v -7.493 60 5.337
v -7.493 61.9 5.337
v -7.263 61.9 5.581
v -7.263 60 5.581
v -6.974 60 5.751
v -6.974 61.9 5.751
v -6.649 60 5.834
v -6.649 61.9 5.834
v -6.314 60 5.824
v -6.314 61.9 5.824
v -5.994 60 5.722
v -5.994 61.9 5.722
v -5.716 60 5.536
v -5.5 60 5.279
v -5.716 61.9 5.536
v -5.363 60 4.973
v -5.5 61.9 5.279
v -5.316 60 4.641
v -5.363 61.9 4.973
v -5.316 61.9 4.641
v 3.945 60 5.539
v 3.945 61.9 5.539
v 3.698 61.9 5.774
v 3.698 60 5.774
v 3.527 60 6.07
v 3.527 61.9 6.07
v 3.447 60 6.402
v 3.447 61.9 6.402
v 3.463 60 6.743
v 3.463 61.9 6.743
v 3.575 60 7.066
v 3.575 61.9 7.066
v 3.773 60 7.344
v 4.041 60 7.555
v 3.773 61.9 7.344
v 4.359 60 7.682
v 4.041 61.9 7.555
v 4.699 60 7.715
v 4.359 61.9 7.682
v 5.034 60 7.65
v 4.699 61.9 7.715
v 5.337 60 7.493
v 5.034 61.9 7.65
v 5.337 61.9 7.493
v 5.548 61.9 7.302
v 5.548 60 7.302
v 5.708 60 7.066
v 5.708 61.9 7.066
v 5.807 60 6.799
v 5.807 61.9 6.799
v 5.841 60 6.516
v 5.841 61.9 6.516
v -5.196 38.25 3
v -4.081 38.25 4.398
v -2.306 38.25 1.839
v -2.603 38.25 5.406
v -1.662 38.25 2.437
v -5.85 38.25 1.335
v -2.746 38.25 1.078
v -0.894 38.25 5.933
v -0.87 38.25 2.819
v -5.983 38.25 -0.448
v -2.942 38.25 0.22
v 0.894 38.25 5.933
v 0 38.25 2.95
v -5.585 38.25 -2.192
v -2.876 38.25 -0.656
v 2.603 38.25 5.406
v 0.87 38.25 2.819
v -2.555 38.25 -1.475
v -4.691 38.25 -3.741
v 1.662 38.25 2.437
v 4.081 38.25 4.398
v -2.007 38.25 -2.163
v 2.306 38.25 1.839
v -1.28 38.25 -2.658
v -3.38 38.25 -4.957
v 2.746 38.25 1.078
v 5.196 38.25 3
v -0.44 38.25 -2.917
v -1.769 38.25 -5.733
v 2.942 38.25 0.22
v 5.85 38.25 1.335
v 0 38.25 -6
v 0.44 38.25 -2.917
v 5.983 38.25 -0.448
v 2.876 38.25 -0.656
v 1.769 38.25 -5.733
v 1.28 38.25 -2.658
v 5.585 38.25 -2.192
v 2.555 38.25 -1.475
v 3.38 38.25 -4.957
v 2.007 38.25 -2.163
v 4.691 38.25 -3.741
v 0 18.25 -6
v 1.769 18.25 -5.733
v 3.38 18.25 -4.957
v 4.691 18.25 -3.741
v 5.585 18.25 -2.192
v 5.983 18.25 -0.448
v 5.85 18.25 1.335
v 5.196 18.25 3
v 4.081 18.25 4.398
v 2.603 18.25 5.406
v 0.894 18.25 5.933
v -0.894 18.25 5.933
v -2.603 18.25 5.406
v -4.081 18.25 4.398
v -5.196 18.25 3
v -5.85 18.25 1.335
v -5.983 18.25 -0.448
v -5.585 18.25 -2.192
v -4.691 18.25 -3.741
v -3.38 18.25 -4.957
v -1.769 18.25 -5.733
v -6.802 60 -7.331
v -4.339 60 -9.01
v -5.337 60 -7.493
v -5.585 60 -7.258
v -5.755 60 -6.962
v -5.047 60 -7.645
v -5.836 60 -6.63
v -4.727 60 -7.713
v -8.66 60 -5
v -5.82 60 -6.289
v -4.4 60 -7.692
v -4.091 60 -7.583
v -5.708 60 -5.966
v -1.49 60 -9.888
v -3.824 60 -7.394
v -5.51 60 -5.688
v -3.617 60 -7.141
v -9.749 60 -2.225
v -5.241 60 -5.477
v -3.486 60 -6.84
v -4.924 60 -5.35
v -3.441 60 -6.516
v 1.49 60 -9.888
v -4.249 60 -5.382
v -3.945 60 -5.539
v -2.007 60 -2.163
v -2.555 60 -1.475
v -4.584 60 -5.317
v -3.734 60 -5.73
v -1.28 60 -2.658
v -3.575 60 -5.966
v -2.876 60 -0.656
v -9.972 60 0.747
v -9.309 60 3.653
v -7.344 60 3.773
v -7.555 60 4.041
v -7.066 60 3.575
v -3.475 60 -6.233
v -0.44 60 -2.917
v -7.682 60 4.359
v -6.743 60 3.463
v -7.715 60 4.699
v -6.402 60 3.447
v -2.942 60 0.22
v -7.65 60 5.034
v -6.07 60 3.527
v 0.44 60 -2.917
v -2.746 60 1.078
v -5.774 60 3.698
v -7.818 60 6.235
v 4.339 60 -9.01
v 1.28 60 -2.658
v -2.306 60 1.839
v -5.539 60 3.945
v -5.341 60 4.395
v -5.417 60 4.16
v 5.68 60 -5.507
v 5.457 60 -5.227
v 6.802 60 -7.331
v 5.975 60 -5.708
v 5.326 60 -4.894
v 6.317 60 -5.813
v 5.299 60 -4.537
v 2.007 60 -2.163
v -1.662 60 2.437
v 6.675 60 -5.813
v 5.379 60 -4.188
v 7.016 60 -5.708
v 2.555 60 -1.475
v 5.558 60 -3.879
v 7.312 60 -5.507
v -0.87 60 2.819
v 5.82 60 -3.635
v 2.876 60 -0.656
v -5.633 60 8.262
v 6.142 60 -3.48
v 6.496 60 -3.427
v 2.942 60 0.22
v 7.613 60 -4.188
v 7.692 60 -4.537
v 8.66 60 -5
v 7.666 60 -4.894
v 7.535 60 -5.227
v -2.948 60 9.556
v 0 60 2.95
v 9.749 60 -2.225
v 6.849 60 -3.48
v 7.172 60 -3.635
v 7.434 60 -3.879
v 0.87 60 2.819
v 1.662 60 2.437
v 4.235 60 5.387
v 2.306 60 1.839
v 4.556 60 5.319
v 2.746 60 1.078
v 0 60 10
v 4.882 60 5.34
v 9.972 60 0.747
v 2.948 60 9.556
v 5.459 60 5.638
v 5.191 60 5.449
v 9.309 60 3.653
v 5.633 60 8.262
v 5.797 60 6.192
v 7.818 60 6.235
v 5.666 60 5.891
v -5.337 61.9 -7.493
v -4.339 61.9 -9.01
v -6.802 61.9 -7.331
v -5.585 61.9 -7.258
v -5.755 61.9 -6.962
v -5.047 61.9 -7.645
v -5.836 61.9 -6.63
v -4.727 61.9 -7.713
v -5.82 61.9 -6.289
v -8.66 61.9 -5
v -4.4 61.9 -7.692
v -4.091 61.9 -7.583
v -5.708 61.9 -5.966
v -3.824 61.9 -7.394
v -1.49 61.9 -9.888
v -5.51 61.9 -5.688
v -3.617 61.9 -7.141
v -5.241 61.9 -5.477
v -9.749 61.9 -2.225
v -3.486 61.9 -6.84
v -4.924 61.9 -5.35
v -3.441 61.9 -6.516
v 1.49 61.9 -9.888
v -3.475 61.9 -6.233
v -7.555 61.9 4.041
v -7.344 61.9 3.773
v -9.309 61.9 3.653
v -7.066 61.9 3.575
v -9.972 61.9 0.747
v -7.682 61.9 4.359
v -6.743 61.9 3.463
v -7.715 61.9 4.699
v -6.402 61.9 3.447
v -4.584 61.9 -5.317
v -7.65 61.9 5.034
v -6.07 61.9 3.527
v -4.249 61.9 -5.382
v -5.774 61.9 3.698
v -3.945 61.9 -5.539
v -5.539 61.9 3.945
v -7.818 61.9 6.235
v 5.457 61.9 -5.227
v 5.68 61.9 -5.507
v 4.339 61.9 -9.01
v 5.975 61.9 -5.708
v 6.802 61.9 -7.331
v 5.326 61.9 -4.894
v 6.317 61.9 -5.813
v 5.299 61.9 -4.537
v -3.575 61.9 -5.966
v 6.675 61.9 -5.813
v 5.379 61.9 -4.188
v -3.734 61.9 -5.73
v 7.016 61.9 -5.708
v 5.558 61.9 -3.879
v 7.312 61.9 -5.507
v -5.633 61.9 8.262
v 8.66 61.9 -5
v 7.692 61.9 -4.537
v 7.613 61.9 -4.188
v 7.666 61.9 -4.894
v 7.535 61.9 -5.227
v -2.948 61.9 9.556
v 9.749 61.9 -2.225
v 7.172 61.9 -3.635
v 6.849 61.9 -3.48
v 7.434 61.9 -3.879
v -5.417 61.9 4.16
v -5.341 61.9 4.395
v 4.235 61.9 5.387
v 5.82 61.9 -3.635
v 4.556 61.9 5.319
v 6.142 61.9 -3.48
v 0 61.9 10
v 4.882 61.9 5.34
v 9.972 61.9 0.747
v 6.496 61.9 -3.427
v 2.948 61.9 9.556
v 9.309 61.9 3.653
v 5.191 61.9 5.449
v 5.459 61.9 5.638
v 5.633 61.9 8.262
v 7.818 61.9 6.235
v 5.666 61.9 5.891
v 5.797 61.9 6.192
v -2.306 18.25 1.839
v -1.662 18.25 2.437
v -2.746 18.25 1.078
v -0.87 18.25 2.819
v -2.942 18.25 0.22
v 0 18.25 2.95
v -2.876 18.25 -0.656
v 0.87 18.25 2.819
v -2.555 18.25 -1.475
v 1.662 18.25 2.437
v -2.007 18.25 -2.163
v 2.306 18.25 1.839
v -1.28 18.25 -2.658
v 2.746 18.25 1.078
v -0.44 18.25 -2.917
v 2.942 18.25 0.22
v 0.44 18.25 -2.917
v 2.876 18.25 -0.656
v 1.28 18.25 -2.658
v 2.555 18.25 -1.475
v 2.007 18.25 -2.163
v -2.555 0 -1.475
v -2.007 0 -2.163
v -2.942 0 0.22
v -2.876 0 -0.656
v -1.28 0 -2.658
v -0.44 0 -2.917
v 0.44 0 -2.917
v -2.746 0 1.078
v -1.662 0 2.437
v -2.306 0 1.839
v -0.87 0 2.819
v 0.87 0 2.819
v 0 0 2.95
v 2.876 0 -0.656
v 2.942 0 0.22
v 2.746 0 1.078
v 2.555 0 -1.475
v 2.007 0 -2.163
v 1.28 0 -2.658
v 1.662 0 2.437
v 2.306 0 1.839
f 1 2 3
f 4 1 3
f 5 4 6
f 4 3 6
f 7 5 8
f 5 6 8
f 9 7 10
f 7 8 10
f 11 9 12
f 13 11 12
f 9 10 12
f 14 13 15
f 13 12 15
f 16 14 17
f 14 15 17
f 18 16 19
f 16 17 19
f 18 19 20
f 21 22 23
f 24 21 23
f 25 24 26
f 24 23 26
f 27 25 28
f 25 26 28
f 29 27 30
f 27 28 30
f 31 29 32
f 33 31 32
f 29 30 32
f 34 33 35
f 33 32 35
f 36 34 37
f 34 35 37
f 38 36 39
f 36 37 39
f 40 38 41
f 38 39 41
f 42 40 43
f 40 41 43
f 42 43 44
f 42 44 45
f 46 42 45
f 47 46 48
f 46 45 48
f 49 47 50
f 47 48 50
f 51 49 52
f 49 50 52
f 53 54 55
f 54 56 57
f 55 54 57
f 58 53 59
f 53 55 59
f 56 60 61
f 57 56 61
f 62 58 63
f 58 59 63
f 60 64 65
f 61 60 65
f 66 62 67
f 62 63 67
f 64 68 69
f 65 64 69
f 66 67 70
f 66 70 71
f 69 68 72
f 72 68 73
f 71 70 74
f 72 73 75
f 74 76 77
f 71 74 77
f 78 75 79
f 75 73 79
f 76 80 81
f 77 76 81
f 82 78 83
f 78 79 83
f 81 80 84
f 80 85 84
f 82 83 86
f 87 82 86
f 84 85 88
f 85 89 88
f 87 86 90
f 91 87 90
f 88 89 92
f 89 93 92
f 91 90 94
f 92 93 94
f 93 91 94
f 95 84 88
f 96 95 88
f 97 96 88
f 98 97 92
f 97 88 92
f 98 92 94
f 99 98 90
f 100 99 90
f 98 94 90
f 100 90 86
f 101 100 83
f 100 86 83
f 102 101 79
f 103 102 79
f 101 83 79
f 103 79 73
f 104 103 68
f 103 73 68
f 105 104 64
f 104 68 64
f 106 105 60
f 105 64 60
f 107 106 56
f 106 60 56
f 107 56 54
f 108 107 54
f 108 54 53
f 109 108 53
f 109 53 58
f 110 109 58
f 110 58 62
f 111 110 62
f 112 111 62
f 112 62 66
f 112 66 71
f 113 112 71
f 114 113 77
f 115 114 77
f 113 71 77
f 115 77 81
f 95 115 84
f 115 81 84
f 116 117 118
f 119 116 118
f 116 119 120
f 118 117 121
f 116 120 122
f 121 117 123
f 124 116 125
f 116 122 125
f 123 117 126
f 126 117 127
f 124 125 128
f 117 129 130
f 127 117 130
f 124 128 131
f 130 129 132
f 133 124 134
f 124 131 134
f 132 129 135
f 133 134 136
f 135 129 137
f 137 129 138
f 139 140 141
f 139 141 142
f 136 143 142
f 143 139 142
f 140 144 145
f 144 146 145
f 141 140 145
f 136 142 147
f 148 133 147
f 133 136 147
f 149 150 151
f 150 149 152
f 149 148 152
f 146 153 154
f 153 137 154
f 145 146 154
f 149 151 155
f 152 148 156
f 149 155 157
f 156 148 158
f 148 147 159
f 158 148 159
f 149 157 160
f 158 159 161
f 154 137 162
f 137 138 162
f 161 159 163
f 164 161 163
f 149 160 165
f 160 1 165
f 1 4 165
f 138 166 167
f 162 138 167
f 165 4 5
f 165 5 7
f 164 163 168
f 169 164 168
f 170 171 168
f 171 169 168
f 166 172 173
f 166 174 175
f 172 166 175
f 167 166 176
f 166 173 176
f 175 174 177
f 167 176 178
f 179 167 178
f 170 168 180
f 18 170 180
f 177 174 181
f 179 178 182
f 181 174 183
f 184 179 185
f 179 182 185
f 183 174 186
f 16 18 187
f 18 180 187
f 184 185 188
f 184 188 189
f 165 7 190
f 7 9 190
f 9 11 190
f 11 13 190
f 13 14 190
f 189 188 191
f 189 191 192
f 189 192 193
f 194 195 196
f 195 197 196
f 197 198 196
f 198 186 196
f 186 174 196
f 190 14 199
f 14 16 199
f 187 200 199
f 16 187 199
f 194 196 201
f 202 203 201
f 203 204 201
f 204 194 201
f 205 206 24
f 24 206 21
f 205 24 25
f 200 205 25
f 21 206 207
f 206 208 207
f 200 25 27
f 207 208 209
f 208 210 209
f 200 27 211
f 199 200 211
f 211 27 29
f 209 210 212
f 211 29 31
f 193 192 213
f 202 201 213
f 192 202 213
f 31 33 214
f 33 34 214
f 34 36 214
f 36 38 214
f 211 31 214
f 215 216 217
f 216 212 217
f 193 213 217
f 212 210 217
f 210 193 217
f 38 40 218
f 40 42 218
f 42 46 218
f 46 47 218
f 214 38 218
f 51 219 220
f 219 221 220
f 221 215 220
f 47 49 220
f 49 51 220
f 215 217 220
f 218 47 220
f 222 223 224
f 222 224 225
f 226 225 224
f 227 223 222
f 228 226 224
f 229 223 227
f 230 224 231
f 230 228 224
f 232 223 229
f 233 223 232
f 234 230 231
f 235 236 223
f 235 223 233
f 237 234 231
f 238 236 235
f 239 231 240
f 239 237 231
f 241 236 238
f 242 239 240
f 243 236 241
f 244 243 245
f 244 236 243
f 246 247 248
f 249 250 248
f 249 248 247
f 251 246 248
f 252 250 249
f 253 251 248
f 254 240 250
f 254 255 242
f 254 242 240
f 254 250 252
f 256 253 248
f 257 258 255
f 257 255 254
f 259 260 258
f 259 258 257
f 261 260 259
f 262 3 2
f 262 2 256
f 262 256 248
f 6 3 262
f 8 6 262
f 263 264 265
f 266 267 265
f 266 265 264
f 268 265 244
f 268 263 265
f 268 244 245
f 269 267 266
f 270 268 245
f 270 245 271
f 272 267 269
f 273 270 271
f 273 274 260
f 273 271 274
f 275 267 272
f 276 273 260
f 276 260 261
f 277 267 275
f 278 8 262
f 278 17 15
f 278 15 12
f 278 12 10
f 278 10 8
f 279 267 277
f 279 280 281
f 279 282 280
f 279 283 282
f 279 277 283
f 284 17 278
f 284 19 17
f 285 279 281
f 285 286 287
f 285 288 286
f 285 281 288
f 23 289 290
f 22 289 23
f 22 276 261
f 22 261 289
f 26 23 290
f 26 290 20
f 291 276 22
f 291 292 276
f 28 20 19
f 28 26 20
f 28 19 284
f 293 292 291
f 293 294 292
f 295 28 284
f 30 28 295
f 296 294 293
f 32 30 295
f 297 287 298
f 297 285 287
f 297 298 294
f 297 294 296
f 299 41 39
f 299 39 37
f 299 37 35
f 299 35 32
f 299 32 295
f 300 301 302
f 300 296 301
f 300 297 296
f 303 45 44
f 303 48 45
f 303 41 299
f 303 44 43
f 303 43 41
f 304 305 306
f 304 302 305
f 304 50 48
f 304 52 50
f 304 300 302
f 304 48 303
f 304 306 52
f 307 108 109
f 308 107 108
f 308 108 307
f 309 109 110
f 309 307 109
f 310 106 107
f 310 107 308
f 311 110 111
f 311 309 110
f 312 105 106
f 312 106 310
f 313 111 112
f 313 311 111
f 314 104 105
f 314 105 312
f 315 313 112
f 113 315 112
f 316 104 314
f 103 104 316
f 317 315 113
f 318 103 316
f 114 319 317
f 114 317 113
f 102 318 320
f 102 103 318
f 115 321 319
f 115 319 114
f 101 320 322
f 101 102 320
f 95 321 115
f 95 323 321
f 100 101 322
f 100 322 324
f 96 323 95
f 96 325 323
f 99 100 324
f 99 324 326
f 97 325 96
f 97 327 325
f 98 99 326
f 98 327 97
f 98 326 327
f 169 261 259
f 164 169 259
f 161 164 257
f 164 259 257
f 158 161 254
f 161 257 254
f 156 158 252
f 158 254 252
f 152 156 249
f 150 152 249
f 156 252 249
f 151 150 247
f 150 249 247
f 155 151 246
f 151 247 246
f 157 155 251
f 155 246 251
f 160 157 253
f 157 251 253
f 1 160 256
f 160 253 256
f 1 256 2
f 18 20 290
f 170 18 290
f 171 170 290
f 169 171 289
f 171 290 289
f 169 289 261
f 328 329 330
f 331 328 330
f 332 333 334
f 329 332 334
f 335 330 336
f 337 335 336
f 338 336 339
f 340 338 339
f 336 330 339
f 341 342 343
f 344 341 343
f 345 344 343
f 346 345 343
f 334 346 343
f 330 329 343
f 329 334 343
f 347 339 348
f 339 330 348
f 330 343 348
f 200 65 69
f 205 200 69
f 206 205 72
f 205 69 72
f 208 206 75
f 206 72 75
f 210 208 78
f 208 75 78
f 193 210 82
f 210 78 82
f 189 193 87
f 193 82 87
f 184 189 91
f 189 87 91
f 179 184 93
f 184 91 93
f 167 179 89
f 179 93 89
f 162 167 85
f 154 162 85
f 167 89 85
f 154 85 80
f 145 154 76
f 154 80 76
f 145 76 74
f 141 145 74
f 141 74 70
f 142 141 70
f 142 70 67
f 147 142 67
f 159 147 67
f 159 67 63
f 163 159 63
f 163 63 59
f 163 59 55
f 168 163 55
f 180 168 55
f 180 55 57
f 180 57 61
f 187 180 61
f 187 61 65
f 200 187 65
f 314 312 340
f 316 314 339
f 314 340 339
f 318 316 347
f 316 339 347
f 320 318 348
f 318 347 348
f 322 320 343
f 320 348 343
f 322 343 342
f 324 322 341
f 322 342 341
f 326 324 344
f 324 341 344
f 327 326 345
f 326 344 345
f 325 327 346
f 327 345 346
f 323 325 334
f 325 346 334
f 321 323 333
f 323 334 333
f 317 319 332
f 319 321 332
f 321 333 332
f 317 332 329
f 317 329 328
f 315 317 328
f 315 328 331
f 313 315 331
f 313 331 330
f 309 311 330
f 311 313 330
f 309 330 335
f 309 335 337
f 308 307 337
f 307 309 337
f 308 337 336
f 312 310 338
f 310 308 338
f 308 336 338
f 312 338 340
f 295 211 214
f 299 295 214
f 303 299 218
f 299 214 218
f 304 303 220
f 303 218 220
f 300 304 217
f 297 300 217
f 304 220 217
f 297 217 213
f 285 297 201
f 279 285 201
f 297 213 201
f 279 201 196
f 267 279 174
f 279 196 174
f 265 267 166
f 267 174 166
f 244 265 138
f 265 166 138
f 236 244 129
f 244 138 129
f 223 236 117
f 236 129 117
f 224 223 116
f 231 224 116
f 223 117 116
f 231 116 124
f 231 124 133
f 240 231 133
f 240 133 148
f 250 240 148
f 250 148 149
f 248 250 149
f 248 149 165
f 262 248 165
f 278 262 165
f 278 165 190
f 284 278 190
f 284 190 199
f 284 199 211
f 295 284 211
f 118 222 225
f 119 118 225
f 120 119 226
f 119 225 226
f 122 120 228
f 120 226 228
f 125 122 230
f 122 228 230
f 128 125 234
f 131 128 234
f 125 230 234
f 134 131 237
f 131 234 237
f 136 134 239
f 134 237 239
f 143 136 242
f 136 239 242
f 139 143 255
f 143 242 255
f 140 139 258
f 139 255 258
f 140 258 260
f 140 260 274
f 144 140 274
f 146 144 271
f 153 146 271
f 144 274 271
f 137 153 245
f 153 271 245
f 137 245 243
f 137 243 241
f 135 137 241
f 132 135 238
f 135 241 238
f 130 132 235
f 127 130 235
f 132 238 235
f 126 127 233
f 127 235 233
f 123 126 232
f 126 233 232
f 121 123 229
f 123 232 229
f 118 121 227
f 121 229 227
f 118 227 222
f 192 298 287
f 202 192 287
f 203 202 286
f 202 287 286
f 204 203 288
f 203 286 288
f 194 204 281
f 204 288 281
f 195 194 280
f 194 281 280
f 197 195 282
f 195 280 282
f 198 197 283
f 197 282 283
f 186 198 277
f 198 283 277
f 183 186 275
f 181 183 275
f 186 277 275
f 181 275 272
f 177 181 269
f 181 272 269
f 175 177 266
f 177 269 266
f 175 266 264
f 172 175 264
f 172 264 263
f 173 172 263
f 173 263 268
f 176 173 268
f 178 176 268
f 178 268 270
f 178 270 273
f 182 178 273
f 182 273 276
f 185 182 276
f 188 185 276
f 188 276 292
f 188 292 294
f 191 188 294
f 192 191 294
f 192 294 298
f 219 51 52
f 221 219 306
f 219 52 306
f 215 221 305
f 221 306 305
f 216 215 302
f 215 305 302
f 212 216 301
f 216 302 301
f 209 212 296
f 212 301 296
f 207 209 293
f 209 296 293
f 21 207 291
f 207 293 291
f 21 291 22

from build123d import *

# Parameters (mm, degrees)
ESQUISSE1_R             = 2.95
BOSS_EXTRU_1_DEPTH      = 60
ESQUISSE2_R             = 10
BOSS_EXTRU_2_DEPTH      = 3
ESQUISSE3_R             = 1.2
ENL_V_MAT_EXTRU_1_DEPTH = 10
ESQUISSE4_R             = 10
ESQUISSE4_R_2           = 1.2
ENL_V_MAT_EXTRU_2_DEPTH = 1.1
ESQUISSE5_R             = 6
BOSS_EXTRU_3_DEPTH      = 20


with BuildPart() as part:
    # Esquisse1 → Boss.-Extru.1 (new body)
    with BuildSketch(Plane(origin=(0, 0, 0), x_dir=(1, 0, 0), z_dir=(0, 1, 0))):
        with Locations(Location((0, 0, 0), (0, 0, 270))):
            Circle(ESQUISSE1_R)
    extrude(amount=BOSS_EXTRU_1_DEPTH)

    # Esquisse2 → Boss.-Extru.2 (add)
    with BuildSketch(Plane(origin=(0, 60, 0), x_dir=(1, 0, 0), z_dir=(0, 1, 0))):
        with Locations(Location((0, 0, 0), (0, 0, 270))):
            Circle(ESQUISSE2_R)
    extrude(amount=BOSS_EXTRU_2_DEPTH)

    # Esquisse3 → Enlèv. mat.-Extru.1 (cut)
    with BuildSketch(Plane(origin=(0, 63, 0), x_dir=(1, 0, 0), z_dir=(0, 1, 0))):
        with BuildLine():
            ThreePointArc((-5.538612634, -3.945094433), (-7.212207999, -3.663885339), (-7.493417094, -5.337480704))
            Line((-7.493417094, -5.337480704), (-6.516014864, -4.641287568))
            Line((-6.516014864, -4.641287568), (-5.538612634, -3.945094433))
        make_face()
        with BuildLine():
            Line((-6.516014864, -4.641287568), (-7.493417094, -5.337480704))
            ThreePointArc((-7.493417094, -5.337480704), (-6.150558078, -5.784284216), (-5.316014864, -4.641287568))
            ThreePointArc((-5.316014864, -4.641287568), (-5.373018216, -4.275830783), (-5.538612634, -3.945094433))
            Line((-5.538612634, -3.945094433), (-6.516014864, -4.641287568))
        make_face()
        with BuildLine():
            ThreePointArc((-3.441287568, 6.516014864), (-4.091483859, 7.582652516), (-5.337480704, 7.493417094))
            Line((-5.337480704, 7.493417094), (-4.641287568, 6.516014864))
            Line((-4.641287568, 6.516014864), (-3.945094433, 5.538612634))
            ThreePointArc((-3.945094433, 5.538612634), (-3.574649916, 5.966211155), (-3.441287568, 6.516014864))
        make_face()
        with BuildLine():
            Line((-4.641287568, 6.516014864), (-5.337480704, 7.493417094))
            ThreePointArc((-5.337480704, 7.493417094), (-5.618689798, 5.819821729), (-3.945094433, 5.538612634))
            Line((-3.945094433, 5.538612634), (-4.641287568, 6.516014864))
        make_face()
        with BuildLine():
            ThreePointArc((3.945094433, -5.538612634), (3.663885339, -7.212207999), (5.337480704, -7.493417094))
            Line((5.337480704, -7.493417094), (4.641287568, -6.516014864))
            Line((4.641287568, -6.516014864), (3.945094433, -5.538612634))
        make_face()
        with BuildLine():
            Line((4.641287568, -6.516014864), (5.337480704, -7.493417094))
            ThreePointArc((5.337480704, -7.493417094), (5.707925221, -7.065818573), (5.841287568, -6.516014864))
            ThreePointArc((5.841287568, -6.516014864), (5.191091278, -5.449377212), (3.945094433, -5.538612634))
            Line((3.945094433, -5.538612634), (4.641287568, -6.516014864))
        make_face()
        with Locations(Location((6.495771182, 4.62686821, 0), (0, 0, 270))):
            Circle(ESQUISSE3_R)
    extrude(amount=-ENL_V_MAT_EXTRU_1_DEPTH, mode=Mode.SUBTRACT)

    # Esquisse4 → Enlèv. mat.-Extru.2 (cut)
    with BuildSketch(Plane(origin=(0, 63, 0), x_dir=(1, 0, 0), z_dir=(0, 1, 0))):
        with Locations(Location((0, 0, 0), (0, 0, 270))):
            Circle(ESQUISSE4_R)
        with Locations(Location((4.641287568, -6.516014864, 0), (0, 0, 270))):
            Circle(ESQUISSE4_R_2, mode=Mode.SUBTRACT)
        with Locations(Location((-6.516014864, -4.641287568, 0), (0, 0, 270))):
            Circle(ESQUISSE4_R_2, mode=Mode.SUBTRACT)
        with Locations(Location((6.495771182, 4.62686821, 0), (0, 0, 270))):
            Circle(ESQUISSE4_R_2, mode=Mode.SUBTRACT)
        with Locations(Location((-4.641287568, 6.516014864, 0), (0, 0, 270))):
            Circle(ESQUISSE4_R_2, mode=Mode.SUBTRACT)
    extrude(amount=-ENL_V_MAT_EXTRU_2_DEPTH, mode=Mode.SUBTRACT)

    # Esquisse5 → Boss.-Extru.3 (add)
    with BuildSketch(Plane(origin=(0, 38.25, 0), x_dir=(-1, 0, 0), z_dir=(0, -1, 0))):
        with Locations(Location((0, 0, 0), (0, 0, 90))):
            Circle(ESQUISSE5_R)
    extrude(amount=BOSS_EXTRU_3_DEPTH)


solid = part.part
